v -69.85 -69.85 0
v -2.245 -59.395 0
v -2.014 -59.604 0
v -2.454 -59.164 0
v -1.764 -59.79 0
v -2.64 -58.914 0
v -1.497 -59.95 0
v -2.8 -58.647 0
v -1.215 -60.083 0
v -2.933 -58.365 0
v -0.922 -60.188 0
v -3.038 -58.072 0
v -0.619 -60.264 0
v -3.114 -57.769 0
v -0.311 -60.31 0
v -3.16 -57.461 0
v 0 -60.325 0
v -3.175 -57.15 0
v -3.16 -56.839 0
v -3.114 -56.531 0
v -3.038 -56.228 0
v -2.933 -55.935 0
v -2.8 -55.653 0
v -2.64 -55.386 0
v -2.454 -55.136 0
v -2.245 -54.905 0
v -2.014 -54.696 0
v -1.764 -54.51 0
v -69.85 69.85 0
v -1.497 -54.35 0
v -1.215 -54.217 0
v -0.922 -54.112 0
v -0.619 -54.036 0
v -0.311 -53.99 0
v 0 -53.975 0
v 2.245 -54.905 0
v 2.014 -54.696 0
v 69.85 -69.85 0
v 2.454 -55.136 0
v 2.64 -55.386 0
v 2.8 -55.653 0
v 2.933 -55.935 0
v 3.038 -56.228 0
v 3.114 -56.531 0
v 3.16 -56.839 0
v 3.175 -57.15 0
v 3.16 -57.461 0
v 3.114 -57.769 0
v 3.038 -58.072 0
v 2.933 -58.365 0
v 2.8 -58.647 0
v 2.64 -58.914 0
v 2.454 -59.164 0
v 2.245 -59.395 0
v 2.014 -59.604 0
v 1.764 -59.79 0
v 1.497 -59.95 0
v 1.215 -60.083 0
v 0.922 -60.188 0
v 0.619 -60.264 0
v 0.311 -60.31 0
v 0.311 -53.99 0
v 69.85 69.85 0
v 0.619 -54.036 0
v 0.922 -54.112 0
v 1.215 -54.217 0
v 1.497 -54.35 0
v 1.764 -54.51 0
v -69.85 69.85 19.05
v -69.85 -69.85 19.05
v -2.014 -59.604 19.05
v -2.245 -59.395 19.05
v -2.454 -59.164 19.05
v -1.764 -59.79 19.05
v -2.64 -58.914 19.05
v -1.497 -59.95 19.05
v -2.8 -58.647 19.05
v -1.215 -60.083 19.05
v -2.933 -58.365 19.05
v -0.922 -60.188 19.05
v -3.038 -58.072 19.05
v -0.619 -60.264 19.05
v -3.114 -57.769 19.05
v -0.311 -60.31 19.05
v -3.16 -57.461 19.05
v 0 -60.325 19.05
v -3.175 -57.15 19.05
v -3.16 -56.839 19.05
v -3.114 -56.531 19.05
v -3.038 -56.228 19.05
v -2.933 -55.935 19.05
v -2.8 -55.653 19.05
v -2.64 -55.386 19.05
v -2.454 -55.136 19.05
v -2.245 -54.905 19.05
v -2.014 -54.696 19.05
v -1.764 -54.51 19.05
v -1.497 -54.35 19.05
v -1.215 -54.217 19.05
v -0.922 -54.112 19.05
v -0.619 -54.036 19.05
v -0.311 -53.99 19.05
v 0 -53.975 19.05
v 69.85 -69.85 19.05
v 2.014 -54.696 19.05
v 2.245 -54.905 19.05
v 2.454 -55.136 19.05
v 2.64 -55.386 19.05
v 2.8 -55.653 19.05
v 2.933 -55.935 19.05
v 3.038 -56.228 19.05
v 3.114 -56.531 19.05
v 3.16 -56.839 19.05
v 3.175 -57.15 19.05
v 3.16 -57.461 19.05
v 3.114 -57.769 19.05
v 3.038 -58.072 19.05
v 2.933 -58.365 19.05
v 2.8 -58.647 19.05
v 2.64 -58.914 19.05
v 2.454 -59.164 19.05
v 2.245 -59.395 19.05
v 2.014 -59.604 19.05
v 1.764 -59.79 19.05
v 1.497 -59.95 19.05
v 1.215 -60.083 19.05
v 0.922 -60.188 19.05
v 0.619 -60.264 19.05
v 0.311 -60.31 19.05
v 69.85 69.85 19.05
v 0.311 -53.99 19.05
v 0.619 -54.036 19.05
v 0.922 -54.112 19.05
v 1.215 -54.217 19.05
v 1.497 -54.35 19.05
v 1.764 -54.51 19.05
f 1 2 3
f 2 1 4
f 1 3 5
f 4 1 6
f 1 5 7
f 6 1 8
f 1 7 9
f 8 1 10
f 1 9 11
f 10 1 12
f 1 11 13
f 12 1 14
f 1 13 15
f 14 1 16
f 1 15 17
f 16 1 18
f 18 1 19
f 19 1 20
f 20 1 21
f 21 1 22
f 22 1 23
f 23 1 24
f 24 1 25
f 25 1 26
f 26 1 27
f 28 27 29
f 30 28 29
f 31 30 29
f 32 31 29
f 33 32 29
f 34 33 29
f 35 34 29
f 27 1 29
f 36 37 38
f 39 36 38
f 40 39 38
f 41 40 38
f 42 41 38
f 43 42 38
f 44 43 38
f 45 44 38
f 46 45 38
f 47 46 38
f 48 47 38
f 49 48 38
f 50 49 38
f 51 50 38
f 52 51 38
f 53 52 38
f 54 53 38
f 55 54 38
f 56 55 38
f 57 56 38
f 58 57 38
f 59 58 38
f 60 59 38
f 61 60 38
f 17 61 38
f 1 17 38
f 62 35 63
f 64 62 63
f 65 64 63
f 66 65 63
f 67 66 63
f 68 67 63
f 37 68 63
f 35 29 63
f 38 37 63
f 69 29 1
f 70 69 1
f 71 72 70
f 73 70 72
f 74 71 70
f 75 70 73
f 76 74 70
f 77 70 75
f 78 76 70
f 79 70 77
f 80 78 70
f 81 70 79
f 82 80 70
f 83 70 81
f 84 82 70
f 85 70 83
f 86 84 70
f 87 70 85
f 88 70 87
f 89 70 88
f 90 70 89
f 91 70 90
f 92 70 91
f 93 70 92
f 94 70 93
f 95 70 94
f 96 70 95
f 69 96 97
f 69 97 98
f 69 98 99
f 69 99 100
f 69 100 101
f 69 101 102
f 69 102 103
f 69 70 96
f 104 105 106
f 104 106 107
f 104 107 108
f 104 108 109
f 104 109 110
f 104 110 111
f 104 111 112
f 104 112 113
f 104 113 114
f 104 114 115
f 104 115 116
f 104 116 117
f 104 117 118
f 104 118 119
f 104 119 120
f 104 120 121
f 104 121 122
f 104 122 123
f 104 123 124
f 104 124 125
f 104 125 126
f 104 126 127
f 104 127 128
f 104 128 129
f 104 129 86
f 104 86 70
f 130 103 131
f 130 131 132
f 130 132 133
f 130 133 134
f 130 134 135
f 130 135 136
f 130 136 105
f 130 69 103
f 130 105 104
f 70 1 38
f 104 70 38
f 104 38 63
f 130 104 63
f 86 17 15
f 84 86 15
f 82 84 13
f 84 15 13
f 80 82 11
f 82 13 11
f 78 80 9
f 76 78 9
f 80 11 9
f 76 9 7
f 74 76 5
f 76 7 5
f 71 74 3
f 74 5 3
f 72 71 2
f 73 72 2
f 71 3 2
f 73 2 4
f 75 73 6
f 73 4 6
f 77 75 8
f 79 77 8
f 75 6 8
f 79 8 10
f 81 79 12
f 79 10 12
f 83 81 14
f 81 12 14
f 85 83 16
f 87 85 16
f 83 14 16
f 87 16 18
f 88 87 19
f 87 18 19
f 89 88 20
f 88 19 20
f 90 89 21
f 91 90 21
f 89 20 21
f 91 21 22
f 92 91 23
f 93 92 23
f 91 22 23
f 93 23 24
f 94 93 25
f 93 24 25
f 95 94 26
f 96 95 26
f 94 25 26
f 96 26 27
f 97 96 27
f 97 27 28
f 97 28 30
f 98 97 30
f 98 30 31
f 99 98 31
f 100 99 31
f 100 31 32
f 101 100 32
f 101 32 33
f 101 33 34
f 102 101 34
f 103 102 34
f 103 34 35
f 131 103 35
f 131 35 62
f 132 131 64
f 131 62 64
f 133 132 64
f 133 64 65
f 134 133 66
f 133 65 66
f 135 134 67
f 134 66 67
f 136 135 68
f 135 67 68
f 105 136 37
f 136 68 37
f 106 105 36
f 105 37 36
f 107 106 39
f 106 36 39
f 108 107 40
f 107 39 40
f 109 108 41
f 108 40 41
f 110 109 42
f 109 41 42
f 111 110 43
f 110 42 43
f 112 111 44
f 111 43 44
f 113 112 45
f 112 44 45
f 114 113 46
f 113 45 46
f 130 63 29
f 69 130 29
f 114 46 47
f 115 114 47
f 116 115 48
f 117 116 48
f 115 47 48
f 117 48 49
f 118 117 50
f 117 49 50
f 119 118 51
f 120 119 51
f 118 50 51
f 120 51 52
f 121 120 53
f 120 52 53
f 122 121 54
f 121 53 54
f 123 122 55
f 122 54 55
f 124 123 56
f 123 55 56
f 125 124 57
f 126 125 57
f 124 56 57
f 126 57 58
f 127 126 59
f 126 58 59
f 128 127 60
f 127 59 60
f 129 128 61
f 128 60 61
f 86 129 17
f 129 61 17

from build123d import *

# Parameters (mm, degrees)
F1_DEPTH = 19.05


with BuildPart() as f1:
    # F0 (on Top) → F1 (new body)
    with BuildSketch(Plane.XY):
        with BuildLine():
            ThreePointArc((3.175, -57.15), (-2.245064, -54.904936), (0, -60.325))
            ThreePointArc((0, -60.325), (2.245064, -59.395064), (3.175, -57.15))
        make_face()
        Polygon((69.85, 69.85), (-69.85, 69.85), (-69.85, -69.85), (0, -69.85), (69.85, -69.85), align=None)
        with BuildLine():
            ThreePointArc((3.175, -57.15), (2.245064, -59.395064), (0, -60.325))
            ThreePointArc((0, -60.325), (-2.245064, -54.904936), (3.175, -57.15))
        make_face(mode=Mode.SUBTRACT)
    extrude(amount=F1_DEPTH)


solid = f1.part
